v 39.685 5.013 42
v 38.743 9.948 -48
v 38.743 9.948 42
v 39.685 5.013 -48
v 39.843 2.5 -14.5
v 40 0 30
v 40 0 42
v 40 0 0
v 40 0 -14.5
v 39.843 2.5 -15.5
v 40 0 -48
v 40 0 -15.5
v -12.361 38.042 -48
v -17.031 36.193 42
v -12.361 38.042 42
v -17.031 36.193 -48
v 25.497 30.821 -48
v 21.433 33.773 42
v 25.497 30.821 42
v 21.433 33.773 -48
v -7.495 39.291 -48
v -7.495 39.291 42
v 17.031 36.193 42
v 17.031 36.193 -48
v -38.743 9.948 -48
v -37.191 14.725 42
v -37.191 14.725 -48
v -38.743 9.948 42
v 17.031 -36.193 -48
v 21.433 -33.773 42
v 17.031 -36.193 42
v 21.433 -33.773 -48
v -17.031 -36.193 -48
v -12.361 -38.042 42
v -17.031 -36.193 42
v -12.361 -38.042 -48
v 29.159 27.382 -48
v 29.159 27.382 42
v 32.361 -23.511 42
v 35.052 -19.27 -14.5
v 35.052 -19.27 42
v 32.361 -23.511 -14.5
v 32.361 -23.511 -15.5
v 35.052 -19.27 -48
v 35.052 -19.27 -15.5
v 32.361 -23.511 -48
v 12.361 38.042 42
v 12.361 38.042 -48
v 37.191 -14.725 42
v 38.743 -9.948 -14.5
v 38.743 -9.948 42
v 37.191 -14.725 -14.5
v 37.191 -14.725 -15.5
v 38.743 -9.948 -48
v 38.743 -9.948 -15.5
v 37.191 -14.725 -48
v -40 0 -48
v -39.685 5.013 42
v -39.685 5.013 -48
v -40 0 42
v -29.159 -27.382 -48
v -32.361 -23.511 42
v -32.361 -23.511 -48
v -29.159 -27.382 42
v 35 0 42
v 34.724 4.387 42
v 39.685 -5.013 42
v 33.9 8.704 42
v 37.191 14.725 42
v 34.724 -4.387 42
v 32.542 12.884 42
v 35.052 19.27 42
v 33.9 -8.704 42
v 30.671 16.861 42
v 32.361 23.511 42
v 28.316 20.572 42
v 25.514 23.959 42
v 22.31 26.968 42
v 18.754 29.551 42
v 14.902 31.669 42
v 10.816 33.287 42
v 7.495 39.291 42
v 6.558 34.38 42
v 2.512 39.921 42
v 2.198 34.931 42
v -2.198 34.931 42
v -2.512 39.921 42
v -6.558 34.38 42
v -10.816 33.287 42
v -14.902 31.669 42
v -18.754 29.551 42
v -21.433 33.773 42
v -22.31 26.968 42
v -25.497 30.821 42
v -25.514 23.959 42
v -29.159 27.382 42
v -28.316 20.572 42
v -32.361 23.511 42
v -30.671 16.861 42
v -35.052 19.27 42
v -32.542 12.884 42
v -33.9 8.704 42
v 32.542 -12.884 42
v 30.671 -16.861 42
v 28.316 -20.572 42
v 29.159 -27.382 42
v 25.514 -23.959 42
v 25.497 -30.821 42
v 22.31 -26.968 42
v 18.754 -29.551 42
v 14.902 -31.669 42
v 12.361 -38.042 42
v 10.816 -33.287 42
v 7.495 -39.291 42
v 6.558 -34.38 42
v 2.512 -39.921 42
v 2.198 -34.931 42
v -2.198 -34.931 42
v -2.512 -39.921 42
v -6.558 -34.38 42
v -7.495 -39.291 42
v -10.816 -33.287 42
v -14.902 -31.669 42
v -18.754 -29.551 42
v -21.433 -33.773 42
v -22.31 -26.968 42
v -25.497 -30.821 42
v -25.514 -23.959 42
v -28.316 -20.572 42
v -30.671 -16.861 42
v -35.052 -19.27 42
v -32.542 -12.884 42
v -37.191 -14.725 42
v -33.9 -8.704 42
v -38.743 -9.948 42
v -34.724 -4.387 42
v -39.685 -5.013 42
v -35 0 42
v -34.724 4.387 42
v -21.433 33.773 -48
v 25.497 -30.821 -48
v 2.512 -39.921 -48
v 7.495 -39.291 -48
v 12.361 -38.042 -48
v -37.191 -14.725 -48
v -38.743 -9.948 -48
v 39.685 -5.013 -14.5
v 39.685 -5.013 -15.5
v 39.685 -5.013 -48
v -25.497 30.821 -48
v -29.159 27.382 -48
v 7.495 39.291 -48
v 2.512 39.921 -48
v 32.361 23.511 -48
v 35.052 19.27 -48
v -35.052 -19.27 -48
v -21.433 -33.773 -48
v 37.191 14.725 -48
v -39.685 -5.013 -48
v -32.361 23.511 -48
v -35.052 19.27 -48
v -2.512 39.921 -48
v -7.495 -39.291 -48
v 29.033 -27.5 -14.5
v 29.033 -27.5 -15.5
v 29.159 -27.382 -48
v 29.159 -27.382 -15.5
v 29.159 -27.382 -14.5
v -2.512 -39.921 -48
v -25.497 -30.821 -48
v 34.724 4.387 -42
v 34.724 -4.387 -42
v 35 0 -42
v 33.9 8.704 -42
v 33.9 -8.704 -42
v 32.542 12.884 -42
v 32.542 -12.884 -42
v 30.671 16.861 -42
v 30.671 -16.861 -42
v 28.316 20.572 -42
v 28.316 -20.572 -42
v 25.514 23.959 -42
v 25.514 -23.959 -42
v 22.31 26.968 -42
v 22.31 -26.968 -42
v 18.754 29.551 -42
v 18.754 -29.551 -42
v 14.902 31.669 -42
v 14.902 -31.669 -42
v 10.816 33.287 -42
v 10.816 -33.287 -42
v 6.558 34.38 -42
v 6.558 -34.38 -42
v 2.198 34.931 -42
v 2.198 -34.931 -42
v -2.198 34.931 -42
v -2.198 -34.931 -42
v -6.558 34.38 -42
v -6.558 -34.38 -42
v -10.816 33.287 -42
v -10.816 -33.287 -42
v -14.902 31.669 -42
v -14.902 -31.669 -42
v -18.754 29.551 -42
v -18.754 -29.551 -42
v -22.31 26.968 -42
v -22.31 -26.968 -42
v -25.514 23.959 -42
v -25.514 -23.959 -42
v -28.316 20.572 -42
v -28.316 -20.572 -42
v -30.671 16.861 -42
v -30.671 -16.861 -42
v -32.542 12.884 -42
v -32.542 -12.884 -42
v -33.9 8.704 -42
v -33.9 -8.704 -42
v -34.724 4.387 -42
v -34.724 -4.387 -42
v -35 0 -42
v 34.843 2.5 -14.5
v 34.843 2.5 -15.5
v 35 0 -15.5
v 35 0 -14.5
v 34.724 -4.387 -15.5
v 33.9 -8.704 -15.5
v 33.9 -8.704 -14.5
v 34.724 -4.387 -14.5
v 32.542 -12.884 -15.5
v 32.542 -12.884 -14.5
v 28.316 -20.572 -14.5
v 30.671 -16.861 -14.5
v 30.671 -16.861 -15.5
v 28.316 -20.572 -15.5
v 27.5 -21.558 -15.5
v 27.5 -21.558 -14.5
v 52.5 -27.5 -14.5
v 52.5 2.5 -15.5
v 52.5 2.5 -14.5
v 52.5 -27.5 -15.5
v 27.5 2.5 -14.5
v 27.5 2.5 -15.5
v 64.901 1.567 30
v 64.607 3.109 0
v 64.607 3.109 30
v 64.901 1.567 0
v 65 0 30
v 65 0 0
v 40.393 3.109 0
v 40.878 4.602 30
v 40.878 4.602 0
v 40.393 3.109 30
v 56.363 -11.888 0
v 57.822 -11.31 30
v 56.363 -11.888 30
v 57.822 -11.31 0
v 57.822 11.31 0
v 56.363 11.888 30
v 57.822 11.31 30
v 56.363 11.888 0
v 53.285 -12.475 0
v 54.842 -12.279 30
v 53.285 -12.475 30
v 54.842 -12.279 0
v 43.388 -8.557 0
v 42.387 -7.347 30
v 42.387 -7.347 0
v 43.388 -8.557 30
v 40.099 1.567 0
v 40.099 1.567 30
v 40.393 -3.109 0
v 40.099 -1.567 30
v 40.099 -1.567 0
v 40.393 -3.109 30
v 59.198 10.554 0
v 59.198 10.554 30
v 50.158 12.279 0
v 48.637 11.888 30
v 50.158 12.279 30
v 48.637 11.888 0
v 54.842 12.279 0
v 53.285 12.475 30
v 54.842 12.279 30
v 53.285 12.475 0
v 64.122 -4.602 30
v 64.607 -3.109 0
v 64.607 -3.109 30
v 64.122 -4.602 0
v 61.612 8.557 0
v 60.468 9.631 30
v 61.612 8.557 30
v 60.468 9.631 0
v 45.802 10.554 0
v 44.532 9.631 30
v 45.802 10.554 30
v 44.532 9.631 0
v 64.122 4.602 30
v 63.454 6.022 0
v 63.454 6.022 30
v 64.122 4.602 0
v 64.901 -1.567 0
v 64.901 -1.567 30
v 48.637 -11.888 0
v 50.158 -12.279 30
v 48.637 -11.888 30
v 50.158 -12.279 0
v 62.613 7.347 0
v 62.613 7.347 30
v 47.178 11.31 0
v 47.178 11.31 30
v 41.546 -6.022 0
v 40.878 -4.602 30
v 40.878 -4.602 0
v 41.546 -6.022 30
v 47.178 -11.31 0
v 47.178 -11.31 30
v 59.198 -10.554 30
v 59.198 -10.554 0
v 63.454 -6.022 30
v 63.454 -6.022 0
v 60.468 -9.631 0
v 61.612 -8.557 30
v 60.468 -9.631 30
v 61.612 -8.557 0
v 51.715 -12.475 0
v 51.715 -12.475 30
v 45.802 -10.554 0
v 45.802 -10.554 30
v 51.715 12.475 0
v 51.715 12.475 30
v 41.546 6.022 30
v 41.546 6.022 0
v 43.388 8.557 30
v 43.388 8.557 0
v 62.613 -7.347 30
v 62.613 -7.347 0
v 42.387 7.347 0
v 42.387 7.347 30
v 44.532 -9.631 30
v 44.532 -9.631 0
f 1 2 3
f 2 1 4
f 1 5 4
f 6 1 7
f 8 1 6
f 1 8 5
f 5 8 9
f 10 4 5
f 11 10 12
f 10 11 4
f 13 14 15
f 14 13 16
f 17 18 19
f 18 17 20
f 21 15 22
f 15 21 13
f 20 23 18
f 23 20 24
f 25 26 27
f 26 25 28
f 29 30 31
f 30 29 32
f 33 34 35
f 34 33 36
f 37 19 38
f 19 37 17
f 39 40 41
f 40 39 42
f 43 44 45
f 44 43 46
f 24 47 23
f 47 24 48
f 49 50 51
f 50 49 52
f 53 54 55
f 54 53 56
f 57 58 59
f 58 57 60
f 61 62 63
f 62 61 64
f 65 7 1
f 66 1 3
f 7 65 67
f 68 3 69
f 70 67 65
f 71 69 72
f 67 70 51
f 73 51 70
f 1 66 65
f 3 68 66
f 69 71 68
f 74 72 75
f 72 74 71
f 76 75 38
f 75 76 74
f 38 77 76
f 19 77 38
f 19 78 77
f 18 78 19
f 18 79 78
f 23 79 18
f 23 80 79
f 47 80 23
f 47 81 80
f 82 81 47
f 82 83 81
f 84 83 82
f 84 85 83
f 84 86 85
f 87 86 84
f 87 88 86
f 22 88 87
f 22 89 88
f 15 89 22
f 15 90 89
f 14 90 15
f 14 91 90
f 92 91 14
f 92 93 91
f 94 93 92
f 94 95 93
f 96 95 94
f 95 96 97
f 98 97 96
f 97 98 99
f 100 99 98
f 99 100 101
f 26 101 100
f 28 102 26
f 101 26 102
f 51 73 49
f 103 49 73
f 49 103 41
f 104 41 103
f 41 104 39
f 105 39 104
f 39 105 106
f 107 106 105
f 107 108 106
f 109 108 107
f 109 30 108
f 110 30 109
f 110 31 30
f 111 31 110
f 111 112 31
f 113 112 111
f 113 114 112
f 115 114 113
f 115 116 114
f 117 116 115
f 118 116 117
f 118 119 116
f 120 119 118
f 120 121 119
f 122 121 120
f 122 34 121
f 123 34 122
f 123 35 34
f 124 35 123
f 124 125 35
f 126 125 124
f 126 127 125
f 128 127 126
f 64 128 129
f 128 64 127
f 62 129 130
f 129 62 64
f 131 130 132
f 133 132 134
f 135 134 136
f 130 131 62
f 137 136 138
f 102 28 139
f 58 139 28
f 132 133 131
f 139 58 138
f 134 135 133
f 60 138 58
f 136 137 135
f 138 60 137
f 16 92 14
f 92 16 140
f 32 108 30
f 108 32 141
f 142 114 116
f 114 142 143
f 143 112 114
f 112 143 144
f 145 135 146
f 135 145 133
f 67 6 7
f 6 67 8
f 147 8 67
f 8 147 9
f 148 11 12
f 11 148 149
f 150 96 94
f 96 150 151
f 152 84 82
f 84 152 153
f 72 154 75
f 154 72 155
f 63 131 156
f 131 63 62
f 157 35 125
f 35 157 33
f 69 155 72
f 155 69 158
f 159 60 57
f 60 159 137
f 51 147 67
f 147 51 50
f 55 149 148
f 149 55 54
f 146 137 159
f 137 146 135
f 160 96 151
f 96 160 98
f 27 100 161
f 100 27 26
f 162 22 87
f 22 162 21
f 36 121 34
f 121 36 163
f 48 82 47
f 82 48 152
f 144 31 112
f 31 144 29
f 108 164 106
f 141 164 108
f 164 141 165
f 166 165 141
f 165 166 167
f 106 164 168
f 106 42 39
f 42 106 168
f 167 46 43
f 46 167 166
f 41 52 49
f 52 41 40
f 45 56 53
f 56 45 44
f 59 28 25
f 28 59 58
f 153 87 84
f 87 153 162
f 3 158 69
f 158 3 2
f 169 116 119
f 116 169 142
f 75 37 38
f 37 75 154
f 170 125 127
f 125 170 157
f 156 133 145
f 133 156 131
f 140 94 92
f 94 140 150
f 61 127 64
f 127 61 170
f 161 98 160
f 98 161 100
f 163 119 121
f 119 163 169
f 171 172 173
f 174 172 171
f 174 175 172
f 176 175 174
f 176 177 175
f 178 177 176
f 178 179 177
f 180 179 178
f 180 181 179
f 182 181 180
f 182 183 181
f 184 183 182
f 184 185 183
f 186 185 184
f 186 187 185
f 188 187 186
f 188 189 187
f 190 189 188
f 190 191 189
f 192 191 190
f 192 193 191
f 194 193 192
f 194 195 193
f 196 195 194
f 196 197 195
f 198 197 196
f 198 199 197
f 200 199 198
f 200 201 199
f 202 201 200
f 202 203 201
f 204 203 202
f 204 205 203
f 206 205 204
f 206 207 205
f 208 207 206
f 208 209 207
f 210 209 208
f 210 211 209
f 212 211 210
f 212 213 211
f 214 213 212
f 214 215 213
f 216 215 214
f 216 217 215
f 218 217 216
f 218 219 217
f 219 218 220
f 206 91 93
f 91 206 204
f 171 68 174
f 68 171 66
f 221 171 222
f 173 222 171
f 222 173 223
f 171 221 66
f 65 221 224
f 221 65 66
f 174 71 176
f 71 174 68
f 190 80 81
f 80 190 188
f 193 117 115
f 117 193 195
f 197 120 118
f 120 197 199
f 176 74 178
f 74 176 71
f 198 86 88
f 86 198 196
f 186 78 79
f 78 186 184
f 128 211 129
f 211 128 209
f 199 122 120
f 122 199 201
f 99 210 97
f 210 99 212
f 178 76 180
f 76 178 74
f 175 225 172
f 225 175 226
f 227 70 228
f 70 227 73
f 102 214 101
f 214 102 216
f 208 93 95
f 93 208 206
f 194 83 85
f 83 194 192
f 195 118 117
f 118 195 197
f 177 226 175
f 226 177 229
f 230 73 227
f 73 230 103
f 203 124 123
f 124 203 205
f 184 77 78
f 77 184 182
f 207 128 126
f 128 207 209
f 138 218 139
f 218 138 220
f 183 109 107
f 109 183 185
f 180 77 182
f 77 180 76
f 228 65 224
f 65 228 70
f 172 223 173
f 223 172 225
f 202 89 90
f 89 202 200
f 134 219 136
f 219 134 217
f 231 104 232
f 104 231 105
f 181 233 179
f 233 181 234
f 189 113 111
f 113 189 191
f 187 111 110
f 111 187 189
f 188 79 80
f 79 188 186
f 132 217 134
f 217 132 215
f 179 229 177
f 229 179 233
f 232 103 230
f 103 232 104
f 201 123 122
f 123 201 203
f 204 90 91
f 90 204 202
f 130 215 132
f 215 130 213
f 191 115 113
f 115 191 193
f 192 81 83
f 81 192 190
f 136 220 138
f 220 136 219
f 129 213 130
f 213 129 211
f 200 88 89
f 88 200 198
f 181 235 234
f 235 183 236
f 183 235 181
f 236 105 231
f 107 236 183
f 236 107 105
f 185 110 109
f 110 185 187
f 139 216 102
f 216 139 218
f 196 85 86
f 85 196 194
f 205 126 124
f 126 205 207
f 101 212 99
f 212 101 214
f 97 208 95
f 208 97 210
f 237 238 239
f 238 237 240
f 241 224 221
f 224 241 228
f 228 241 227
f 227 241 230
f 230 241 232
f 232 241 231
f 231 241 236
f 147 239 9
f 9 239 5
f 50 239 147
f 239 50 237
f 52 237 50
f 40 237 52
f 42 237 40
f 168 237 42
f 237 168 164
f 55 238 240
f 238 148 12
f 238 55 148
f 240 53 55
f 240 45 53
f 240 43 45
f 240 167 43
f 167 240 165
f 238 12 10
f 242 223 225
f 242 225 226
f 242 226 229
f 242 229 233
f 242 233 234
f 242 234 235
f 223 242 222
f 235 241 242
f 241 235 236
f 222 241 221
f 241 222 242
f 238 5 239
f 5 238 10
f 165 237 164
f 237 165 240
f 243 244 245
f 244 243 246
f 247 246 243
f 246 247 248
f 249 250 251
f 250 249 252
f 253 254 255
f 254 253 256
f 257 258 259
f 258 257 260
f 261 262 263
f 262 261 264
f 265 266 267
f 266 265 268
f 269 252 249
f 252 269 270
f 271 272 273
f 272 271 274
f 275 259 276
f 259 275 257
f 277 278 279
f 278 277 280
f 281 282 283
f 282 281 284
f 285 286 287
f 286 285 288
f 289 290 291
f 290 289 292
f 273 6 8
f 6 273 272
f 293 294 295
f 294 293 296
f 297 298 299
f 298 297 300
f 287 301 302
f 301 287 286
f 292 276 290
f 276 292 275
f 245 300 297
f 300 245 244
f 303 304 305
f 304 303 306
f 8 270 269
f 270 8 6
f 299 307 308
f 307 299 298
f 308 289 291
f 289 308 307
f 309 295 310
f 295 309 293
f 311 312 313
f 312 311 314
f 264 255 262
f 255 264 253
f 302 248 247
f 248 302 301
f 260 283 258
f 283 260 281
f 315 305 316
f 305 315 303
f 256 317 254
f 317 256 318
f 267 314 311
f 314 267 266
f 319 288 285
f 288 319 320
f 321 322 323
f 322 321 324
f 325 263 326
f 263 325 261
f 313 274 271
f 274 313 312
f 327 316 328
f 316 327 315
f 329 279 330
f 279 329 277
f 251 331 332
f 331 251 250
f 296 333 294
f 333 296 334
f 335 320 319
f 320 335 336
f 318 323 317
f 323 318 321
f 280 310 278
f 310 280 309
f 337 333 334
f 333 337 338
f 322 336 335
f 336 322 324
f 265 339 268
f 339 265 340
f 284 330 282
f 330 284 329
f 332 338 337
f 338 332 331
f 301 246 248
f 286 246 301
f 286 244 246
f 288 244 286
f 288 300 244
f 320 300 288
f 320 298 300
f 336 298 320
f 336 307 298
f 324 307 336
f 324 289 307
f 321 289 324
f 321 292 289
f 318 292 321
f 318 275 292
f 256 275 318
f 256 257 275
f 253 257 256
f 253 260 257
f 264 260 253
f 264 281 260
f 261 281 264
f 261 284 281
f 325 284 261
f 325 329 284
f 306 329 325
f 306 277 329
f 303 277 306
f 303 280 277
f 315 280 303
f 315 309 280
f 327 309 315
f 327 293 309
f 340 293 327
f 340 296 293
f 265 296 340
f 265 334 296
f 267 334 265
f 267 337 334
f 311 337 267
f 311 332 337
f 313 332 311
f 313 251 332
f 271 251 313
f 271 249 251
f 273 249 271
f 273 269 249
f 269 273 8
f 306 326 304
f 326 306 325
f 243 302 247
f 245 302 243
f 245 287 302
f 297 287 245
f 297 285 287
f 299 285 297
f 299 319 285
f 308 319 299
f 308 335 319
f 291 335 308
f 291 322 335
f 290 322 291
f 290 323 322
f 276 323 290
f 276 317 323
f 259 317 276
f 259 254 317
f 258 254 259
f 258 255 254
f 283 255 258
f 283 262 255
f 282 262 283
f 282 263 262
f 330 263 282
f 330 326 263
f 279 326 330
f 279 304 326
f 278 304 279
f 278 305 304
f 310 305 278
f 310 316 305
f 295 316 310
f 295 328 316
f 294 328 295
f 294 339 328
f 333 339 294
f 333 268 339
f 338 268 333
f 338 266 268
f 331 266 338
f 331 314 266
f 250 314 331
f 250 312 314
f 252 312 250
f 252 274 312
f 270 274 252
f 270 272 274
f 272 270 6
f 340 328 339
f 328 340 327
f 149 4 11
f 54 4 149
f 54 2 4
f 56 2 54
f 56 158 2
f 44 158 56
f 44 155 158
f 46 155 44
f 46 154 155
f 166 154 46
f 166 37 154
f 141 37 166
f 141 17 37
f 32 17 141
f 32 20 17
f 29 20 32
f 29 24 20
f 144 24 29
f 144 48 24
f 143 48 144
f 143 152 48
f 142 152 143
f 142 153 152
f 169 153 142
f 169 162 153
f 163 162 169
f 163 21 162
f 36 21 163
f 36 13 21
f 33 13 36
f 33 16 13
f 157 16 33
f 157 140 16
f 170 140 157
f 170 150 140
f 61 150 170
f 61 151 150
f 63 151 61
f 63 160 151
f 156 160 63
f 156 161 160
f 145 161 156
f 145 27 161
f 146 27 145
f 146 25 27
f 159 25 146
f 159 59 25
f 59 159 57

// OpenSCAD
$fn = 50;

// Main body
difference() {
    cylinder(r=40, h=84, center=true); // Outer cylinder (height: 84mm)
    cylinder(r=35, h=84, center=true); // Inner hollow part (diameter 70mm)
}

translate([0, 0, -42 -6]) // Position base at z = -48
cylinder(r=40, h=6, $fn=$fn, center=false); // Base thickness 6mm

// Handle on +X side
union() {
    // Inner space of handle: 30mm height × 25mm width (fingers area)
    translate([40, -12.5, -15]) 
    cube([25, 30, 1], center=true); 

    // Semicircular protrusion (outer side of D-shape)
    translate([40 + 12.5, 0, 0])
    cylinder(r=12.5, h=30, $fn=$fn, center=false);
}
